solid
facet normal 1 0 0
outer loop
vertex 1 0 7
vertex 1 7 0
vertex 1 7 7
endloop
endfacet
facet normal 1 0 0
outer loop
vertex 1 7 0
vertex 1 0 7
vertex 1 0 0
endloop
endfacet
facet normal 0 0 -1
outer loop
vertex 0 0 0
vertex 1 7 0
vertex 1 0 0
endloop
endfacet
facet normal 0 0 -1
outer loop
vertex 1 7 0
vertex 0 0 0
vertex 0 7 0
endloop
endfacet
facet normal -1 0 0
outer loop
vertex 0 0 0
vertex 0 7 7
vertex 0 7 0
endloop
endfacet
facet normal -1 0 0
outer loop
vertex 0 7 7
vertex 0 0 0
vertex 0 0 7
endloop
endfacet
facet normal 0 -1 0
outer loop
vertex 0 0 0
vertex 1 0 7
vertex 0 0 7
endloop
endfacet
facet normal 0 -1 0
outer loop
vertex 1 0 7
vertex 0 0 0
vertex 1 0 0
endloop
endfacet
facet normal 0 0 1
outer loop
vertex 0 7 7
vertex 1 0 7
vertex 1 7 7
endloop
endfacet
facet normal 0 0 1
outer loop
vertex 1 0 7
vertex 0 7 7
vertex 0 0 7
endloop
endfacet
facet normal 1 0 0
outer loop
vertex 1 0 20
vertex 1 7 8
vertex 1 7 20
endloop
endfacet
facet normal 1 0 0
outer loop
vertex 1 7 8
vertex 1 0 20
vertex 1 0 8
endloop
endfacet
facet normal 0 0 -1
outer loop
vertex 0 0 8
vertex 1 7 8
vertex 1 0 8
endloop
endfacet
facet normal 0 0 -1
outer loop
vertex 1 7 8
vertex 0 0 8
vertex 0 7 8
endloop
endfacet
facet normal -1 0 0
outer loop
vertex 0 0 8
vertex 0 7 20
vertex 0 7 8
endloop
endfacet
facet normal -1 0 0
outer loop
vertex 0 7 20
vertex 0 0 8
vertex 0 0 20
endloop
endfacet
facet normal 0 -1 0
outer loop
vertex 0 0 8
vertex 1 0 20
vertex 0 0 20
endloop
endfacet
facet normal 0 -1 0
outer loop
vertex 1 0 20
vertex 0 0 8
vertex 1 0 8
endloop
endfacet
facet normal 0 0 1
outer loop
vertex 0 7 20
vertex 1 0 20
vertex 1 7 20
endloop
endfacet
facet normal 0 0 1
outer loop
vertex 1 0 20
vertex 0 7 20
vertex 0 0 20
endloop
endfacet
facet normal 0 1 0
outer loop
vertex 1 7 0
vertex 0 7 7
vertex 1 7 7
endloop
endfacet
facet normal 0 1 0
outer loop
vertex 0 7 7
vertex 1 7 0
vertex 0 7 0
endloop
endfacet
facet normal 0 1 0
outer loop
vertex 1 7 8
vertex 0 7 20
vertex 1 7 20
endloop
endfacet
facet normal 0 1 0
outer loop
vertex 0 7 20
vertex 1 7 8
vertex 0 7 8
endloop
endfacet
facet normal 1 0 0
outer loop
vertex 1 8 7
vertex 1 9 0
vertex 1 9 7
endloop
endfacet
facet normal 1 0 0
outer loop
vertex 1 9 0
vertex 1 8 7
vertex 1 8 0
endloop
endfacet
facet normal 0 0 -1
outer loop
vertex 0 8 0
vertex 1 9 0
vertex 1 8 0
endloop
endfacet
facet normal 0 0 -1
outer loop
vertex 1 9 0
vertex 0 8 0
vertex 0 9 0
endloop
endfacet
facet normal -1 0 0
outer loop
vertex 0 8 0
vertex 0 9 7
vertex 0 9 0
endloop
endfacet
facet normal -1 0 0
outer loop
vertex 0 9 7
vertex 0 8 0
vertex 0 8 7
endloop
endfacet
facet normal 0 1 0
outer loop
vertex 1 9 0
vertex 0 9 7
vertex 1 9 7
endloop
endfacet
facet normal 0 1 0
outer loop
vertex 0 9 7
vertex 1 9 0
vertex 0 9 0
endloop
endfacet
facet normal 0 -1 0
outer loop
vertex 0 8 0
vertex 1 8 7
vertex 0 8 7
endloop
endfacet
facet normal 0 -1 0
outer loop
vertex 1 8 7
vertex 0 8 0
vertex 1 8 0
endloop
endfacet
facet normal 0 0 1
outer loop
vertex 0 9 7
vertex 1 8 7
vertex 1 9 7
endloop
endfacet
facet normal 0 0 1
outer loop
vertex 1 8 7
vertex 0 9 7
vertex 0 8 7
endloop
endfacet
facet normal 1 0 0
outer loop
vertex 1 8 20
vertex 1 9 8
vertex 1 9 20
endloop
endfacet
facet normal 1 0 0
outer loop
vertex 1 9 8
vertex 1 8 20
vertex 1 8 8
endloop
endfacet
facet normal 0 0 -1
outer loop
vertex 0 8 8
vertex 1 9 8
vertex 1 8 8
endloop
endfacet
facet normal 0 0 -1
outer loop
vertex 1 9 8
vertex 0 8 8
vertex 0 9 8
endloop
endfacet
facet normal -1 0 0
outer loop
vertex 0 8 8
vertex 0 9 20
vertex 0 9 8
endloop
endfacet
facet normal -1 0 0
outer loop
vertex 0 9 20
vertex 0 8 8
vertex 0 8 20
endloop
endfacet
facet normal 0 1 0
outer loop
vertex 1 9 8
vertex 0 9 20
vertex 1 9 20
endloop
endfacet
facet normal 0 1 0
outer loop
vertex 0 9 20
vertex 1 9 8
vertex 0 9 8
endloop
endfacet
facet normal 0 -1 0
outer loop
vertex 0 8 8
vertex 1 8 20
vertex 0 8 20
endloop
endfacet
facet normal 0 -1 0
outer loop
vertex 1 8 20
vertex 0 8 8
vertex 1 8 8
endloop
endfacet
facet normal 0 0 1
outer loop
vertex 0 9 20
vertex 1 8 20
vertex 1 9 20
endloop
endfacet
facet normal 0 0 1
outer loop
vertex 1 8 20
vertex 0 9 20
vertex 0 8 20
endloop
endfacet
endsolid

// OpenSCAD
union() {
    translate([0.0, 0.0, 0.0]) cube([1, 1, 1]);
    translate([0.0, 0.0, 1.0]) cube([1, 1, 1]);
    translate([0.0, 0.0, 2.0]) cube([1, 1, 1]);
    translate([0.0, 0.0, 3.0]) cube([1, 1, 1]);
    translate([0.0, 0.0, 4.0]) cube([1, 1, 1]);
    translate([0.0, 0.0, 5.0]) cube([1, 1, 1]);
    translate([0.0, 0.0, 6.0]) cube([1, 1, 1]);
    translate([0.0, 0.0, 8.0]) cube([1, 1, 1]);
    translate([0.0, 0.0, 9.0]) cube([1, 1, 1]);
    translate([0.0, 0.0, 10.0]) cube([1, 1, 1]);
    translate([0.0, 0.0, 11.0]) cube([1, 1, 1]);
    translate([0.0, 0.0, 12.0]) cube([1, 1, 1]);
    translate([0.0, 0.0, 13.0]) cube([1, 1, 1]);
    translate([0.0, 0.0, 14.0]) cube([1, 1, 1]);
    translate([0.0, 0.0, 15.0]) cube([1, 1, 1]);
    translate([0.0, 0.0, 16.0]) cube([1, 1, 1]);
    translate([0.0, 0.0, 17.0]) cube([1, 1, 1]);
    translate([0.0, 0.0, 18.0]) cube([1, 1, 1]);
    translate([0.0, 0.0, 19.0]) cube([1, 1, 1]);
    translate([0.0, 1.0, 0.0]) cube([1, 1, 1]);
    translate([0.0, 1.0, 1.0]) cube([1, 1, 1]);
    translate([0.0, 1.0, 2.0]) cube([1, 1, 1]);
    translate([0.0, 1.0, 3.0]) cube([1, 1, 1]);
    translate([0.0, 1.0, 4.0]) cube([1, 1, 1]);
    translate([0.0, 1.0, 5.0]) cube([1, 1, 1]);
    translate([0.0, 1.0, 6.0]) cube([1, 1, 1]);
    translate([0.0, 1.0, 8.0]) cube([1, 1, 1]);
    translate([0.0, 1.0, 9.0]) cube([1, 1, 1]);
    translate([0.0, 1.0, 10.0]) cube([1, 1, 1]);
    translate([0.0, 1.0, 11.0]) cube([1, 1, 1]);
    translate([0.0, 1.0, 12.0]) cube([1, 1, 1]);
    translate([0.0, 1.0, 13.0]) cube([1, 1, 1]);
    translate([0.0, 1.0, 14.0]) cube([1, 1, 1]);
    translate([0.0, 1.0, 15.0]) cube([1, 1, 1]);
    translate([0.0, 1.0, 16.0]) cube([1, 1, 1]);
    translate([0.0, 1.0, 17.0]) cube([1, 1, 1]);
    translate([0.0, 1.0, 18.0]) cube([1, 1, 1]);
    translate([0.0, 1.0, 19.0]) cube([1, 1, 1]);
    translate([0.0, 2.0, 0.0]) cube([1, 1, 1]);
    translate([0.0, 2.0, 1.0]) cube([1, 1, 1]);
    translate([0.0, 2.0, 2.0]) cube([1, 1, 1]);
    translate([0.0, 2.0, 3.0]) cube([1, 1, 1]);
    translate([0.0, 2.0, 4.0]) cube([1, 1, 1]);
    translate([0.0, 2.0, 5.0]) cube([1, 1, 1]);
    translate([0.0, 2.0, 6.0]) cube([1, 1, 1]);
    translate([0.0, 2.0, 8.0]) cube([1, 1, 1]);
    translate([0.0, 2.0, 9.0]) cube([1, 1, 1]);
    translate([0.0, 2.0, 10.0]) cube([1, 1, 1]);
    translate([0.0, 2.0, 11.0]) cube([1, 1, 1]);
    translate([0.0, 2.0, 12.0]) cube([1, 1, 1]);
    translate([0.0, 2.0, 13.0]) cube([1, 1, 1]);
    translate([0.0, 2.0, 14.0]) cube([1, 1, 1]);
    translate([0.0, 2.0, 15.0]) cube([1, 1, 1]);
    translate([0.0, 2.0, 16.0]) cube([1, 1, 1]);
    translate([0.0, 2.0, 17.0]) cube([1, 1, 1]);
    translate([0.0, 2.0, 18.0]) cube([1, 1, 1]);
    translate([0.0, 2.0, 19.0]) cube([1, 1, 1]);
    translate([0.0, 3.0, 0.0]) cube([1, 1, 1]);
    translate([0.0, 3.0, 1.0]) cube([1, 1, 1]);
    translate([0.0, 3.0, 2.0]) cube([1, 1, 1]);
    translate([0.0, 3.0, 3.0]) cube([1, 1, 1]);
    translate([0.0, 3.0, 4.0]) cube([1, 1, 1]);
    translate([0.0, 3.0, 5.0]) cube([1, 1, 1]);
    translate([0.0, 3.0, 6.0]) cube([1, 1, 1]);
    translate([0.0, 3.0, 8.0]) cube([1, 1, 1]);
    translate([0.0, 3.0, 9.0]) cube([1, 1, 1]);
    translate([0.0, 3.0, 10.0]) cube([1, 1, 1]);
    translate([0.0, 3.0, 11.0]) cube([1, 1, 1]);
    translate([0.0, 3.0, 12.0]) cube([1, 1, 1]);
    translate([0.0, 3.0, 13.0]) cube([1, 1, 1]);
    translate([0.0, 3.0, 14.0]) cube([1, 1, 1]);
    translate([0.0, 3.0, 15.0]) cube([1, 1, 1]);
    translate([0.0, 3.0, 16.0]) cube([1, 1, 1]);
    translate([0.0, 3.0, 17.0]) cube([1, 1, 1]);
    translate([0.0, 3.0, 18.0]) cube([1, 1, 1]);
    translate([0.0, 3.0, 19.0]) cube([1, 1, 1]);
    translate([0.0, 4.0, 0.0]) cube([1, 1, 1]);
    translate([0.0, 4.0, 1.0]) cube([1, 1, 1]);
    translate([0.0, 4.0, 2.0]) cube([1, 1, 1]);
    translate([0.0, 4.0, 3.0]) cube([1, 1, 1]);
    translate([0.0, 4.0, 4.0]) cube([1, 1, 1]);
    translate([0.0, 4.0, 5.0]) cube([1, 1, 1]);
    translate([0.0, 4.0, 6.0]) cube([1, 1, 1]);
    translate([0.0, 4.0, 8.0]) cube([1, 1, 1]);
    translate([0.0, 4.0, 9.0]) cube([1, 1, 1]);
    translate([0.0, 4.0, 10.0]) cube([1, 1, 1]);
    translate([0.0, 4.0, 11.0]) cube([1, 1, 1]);
    translate([0.0, 4.0, 12.0]) cube([1, 1, 1]);
    translate([0.0, 4.0, 13.0]) cube([1, 1, 1]);
    translate([0.0, 4.0, 14.0]) cube([1, 1, 1]);
    translate([0.0, 4.0, 15.0]) cube([1, 1, 1]);
    translate([0.0, 4.0, 16.0]) cube([1, 1, 1]);
    translate([0.0, 4.0, 17.0]) cube([1, 1, 1]);
    translate([0.0, 4.0, 18.0]) cube([1, 1, 1]);
    translate([0.0, 4.0, 19.0]) cube([1, 1, 1]);
    translate([0.0, 5.0, 0.0]) cube([1, 1, 1]);
    translate([0.0, 5.0, 1.0]) cube([1, 1, 1]);
    translate([0.0, 5.0, 2.0]) cube([1, 1, 1]);
    translate([0.0, 5.0, 3.0]) cube([1, 1, 1]);
    translate([0.0, 5.0, 4.0]) cube([1, 1, 1]);
    translate([0.0, 5.0, 5.0]) cube([1, 1, 1]);
    translate([0.0, 5.0, 6.0]) cube([1, 1, 1]);
    translate([0.0, 5.0, 8.0]) cube([1, 1, 1]);
    translate([0.0, 5.0, 9.0]) cube([1, 1, 1]);
    translate([0.0, 5.0, 10.0]) cube([1, 1, 1]);
    translate([0.0, 5.0, 11.0]) cube([1, 1, 1]);
    translate([0.0, 5.0, 12.0]) cube([1, 1, 1]);
    translate([0.0, 5.0, 13.0]) cube([1, 1, 1]);
    translate([0.0, 5.0, 14.0]) cube([1, 1, 1]);
    translate([0.0, 5.0, 15.0]) cube([1, 1, 1]);
    translate([0.0, 5.0, 16.0]) cube([1, 1, 1]);
    translate([0.0, 5.0, 17.0]) cube([1, 1, 1]);
    translate([0.0, 5.0, 18.0]) cube([1, 1, 1]);
    translate([0.0, 5.0, 19.0]) cube([1, 1, 1]);
    translate([0.0, 6.0, 0.0]) cube([1, 1, 1]);
    translate([0.0, 6.0, 1.0]) cube([1, 1, 1]);
    translate([0.0, 6.0, 2.0]) cube([1, 1, 1]);
    translate([0.0, 6.0, 3.0]) cube([1, 1, 1]);
    translate([0.0, 6.0, 4.0]) cube([1, 1, 1]);
    translate([0.0, 6.0, 5.0]) cube([1, 1, 1]);
    translate([0.0, 6.0, 6.0]) cube([1, 1, 1]);
    translate([0.0, 6.0, 8.0]) cube([1, 1, 1]);
    translate([0.0, 6.0, 9.0]) cube([1, 1, 1]);
    translate([0.0, 6.0, 10.0]) cube([1, 1, 1]);
    translate([0.0, 6.0, 11.0]) cube([1, 1, 1]);
    translate([0.0, 6.0, 12.0]) cube([1, 1, 1]);
    translate([0.0, 6.0, 13.0]) cube([1, 1, 1]);
    translate([0.0, 6.0, 14.0]) cube([1, 1, 1]);
    translate([0.0, 6.0, 15.0]) cube([1, 1, 1]);
    translate([0.0, 6.0, 16.0]) cube([1, 1, 1]);
    translate([0.0, 6.0, 17.0]) cube([1, 1, 1]);
    translate([0.0, 6.0, 18.0]) cube([1, 1, 1]);
    translate([0.0, 6.0, 19.0]) cube([1, 1, 1]);
    translate([0.0, 8.0, 0.0]) cube([1, 1, 1]);
    translate([0.0, 8.0, 1.0]) cube([1, 1, 1]);
    translate([0.0, 8.0, 2.0]) cube([1, 1, 1]);
    translate([0.0, 8.0, 3.0]) cube([1, 1, 1]);
    translate([0.0, 8.0, 4.0]) cube([1, 1, 1]);
    translate([0.0, 8.0, 5.0]) cube([1, 1, 1]);
    translate([0.0, 8.0, 6.0]) cube([1, 1, 1]);
    translate([0.0, 8.0, 8.0]) cube([1, 1, 1]);
    translate([0.0, 8.0, 9.0]) cube([1, 1, 1]);
    translate([0.0, 8.0, 10.0]) cube([1, 1, 1]);
    translate([0.0, 8.0, 11.0]) cube([1, 1, 1]);
    translate([0.0, 8.0, 12.0]) cube([1, 1, 1]);
    translate([0.0, 8.0, 13.0]) cube([1, 1, 1]);
    translate([0.0, 8.0, 14.0]) cube([1, 1, 1]);
    translate([0.0, 8.0, 15.0]) cube([1, 1, 1]);
    translate([0.0, 8.0, 16.0]) cube([1, 1, 1]);
    translate([0.0, 8.0, 17.0]) cube([1, 1, 1]);
    translate([0.0, 8.0, 18.0]) cube([1, 1, 1]);
    translate([0.0, 8.0, 19.0]) cube([1, 1, 1]);
}
